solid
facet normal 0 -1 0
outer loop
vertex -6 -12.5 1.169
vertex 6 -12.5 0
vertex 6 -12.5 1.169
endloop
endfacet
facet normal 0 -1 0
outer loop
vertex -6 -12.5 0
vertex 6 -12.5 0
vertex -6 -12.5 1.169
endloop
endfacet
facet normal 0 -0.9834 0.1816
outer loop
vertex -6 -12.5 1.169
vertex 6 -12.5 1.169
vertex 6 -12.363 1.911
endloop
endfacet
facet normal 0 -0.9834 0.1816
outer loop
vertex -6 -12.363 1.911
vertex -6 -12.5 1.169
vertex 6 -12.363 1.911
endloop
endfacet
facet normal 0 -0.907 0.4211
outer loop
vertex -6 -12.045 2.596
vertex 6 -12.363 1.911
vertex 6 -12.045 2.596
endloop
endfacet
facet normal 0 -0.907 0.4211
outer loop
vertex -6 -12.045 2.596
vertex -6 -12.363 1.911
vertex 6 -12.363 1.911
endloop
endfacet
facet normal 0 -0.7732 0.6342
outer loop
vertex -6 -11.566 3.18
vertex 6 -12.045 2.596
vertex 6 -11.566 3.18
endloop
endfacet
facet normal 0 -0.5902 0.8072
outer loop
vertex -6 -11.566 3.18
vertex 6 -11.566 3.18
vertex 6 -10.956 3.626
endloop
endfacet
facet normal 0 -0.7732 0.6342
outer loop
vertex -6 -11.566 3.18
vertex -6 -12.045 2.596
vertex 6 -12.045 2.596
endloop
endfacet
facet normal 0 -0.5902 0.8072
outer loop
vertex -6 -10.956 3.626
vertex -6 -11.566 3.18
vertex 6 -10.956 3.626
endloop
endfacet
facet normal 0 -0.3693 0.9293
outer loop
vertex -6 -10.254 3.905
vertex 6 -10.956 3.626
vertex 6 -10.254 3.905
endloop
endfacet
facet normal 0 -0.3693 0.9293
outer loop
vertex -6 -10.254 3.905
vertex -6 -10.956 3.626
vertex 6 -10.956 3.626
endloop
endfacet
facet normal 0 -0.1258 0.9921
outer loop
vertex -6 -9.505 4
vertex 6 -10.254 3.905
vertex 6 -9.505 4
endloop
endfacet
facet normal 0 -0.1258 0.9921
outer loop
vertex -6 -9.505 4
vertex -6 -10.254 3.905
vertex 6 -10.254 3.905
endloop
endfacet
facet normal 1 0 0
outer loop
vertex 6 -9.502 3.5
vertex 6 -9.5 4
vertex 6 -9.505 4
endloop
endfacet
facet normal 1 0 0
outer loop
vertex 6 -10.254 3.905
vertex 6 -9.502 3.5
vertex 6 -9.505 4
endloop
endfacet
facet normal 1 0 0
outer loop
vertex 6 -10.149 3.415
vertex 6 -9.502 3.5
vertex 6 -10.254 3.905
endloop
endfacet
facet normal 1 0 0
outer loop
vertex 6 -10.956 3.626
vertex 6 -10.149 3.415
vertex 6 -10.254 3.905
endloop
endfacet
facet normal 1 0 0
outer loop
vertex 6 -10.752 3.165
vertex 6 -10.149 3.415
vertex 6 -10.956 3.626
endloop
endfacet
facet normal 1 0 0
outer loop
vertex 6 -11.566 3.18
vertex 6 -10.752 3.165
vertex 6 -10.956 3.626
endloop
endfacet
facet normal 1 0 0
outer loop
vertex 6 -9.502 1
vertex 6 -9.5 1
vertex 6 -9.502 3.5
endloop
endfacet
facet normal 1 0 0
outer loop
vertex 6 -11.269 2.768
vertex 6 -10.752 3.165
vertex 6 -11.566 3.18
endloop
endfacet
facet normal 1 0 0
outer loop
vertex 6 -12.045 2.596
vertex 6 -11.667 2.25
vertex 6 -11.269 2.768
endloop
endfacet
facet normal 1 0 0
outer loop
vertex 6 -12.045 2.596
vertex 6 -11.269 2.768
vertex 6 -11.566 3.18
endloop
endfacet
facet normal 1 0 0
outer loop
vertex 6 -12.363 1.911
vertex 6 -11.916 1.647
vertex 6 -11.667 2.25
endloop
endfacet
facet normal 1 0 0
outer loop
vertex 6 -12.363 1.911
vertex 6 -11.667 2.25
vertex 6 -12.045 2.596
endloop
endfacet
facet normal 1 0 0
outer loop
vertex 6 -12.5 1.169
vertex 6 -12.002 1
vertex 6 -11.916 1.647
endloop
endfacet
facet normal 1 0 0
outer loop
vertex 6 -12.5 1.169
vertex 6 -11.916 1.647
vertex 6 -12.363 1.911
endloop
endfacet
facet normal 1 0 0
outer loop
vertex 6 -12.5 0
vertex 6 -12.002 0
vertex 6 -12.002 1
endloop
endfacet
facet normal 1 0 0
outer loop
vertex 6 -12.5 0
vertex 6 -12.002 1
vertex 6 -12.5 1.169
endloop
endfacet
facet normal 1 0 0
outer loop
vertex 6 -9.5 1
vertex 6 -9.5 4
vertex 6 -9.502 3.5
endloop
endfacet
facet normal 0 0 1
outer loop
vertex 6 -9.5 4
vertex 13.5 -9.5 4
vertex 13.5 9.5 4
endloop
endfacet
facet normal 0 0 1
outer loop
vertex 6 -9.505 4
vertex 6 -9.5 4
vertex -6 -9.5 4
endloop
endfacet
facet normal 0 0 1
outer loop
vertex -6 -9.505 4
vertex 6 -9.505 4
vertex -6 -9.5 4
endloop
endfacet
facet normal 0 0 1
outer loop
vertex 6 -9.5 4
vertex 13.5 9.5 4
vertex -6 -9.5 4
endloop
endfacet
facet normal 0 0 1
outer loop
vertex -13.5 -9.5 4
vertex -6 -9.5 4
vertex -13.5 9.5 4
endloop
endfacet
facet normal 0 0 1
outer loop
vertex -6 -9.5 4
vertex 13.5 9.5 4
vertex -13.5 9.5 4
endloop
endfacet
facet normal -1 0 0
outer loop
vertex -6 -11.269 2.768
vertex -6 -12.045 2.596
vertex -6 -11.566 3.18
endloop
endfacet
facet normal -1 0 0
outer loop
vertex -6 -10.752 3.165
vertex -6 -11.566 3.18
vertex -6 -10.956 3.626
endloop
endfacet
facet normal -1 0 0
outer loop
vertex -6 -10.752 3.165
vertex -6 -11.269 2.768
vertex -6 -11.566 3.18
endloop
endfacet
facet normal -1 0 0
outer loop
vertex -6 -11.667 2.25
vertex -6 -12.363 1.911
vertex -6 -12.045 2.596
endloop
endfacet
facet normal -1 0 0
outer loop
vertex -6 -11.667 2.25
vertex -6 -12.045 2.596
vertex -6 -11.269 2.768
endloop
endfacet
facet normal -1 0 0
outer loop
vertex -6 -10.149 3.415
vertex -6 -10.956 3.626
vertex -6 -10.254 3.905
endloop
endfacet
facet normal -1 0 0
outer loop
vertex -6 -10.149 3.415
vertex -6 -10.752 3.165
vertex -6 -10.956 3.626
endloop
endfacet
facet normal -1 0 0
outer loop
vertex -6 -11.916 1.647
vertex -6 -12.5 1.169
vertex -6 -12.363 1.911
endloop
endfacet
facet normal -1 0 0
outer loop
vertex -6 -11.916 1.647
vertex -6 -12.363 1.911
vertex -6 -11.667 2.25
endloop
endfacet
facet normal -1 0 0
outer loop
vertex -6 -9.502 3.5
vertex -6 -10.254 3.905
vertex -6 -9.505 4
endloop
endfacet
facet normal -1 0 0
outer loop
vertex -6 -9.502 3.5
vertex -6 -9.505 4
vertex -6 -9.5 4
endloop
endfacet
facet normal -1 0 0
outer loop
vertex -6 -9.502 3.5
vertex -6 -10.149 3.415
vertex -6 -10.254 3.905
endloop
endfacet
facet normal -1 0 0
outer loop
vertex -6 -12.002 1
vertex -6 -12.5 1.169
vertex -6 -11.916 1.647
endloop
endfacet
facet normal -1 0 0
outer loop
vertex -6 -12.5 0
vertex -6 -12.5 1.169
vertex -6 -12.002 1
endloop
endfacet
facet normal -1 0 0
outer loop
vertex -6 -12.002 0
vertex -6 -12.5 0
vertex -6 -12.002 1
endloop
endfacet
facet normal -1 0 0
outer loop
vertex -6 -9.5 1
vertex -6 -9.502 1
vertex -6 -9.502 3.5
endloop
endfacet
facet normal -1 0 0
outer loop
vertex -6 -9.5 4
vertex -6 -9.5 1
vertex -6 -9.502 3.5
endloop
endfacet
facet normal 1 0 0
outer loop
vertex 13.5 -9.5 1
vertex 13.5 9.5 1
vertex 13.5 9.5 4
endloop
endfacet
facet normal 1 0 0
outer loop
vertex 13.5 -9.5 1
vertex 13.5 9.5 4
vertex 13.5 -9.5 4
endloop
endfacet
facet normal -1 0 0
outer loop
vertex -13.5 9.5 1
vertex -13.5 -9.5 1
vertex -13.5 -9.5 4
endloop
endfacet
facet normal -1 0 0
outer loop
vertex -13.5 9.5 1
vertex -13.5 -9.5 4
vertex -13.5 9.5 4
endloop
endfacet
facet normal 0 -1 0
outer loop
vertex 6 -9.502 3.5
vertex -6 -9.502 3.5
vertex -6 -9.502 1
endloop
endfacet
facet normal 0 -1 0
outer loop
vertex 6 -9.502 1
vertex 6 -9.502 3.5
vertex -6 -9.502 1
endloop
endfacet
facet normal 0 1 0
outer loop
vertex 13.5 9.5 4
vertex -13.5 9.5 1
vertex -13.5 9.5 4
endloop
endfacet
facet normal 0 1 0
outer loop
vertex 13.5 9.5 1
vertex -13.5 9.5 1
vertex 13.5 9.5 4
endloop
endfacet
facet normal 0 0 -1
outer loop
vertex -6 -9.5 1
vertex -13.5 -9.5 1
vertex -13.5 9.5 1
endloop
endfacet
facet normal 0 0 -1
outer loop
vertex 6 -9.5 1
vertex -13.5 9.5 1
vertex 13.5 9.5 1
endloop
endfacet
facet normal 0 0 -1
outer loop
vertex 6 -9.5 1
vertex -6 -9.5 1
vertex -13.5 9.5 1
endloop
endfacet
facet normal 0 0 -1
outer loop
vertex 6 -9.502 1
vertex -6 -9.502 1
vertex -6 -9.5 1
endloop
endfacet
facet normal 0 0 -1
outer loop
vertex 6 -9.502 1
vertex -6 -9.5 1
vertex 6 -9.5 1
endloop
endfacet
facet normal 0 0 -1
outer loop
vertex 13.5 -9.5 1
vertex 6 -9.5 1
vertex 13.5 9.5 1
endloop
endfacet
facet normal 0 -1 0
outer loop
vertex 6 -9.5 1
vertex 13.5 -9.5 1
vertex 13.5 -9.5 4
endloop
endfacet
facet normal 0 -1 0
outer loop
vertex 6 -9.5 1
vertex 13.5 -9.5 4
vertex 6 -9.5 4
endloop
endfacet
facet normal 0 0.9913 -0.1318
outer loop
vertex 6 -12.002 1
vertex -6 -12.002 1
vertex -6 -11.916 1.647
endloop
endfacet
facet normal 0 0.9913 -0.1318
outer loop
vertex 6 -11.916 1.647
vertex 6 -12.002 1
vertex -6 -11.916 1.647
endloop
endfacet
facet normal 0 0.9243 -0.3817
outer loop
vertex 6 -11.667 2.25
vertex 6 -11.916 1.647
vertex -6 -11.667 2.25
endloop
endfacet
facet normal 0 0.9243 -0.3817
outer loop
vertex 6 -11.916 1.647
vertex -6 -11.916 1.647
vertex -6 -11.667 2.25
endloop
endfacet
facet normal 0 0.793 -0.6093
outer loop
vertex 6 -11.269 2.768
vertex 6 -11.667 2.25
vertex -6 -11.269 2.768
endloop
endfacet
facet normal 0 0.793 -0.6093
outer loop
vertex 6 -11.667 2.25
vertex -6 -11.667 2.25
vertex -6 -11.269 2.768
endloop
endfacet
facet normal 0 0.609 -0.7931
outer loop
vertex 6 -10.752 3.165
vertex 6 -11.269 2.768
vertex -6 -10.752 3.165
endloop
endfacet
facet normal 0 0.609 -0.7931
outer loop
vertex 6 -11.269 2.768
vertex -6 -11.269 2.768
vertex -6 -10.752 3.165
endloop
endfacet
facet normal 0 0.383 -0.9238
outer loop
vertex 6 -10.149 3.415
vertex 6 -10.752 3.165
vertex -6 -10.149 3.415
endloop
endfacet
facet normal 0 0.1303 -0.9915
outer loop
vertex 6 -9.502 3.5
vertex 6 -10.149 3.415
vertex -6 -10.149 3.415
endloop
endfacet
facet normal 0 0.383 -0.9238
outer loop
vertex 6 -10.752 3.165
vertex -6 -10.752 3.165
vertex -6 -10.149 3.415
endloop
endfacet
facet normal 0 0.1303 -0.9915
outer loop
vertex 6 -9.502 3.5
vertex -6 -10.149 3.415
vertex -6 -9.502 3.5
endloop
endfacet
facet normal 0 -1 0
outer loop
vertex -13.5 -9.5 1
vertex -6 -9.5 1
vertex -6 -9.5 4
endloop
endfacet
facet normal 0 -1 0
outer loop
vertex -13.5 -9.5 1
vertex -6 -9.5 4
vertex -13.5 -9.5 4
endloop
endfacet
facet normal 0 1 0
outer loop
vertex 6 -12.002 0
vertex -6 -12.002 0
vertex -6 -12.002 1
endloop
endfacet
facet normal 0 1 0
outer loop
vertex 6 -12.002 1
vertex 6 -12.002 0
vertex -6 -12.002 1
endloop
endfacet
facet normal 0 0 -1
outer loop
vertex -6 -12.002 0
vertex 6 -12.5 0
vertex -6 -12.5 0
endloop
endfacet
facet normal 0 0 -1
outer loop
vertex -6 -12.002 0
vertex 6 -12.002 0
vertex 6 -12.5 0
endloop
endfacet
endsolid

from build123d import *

# Parameters (mm, degrees)
PAD_DEPTH       = 4
SKETCH001_W     = 27
SKETCH001_H     = 19
POCKET_DEPTH    = 1
POCKET001_DEPTH = 27
POCKET002_DEPTH = 27


with BuildPart() as part:
    # Sketch → Pad (new body)
    with BuildSketch(Plane.XY):
        Polygon((-13.5, 9.5), (13.5, 9.5), (13.5, -9.5), (6, -9.5), (6, -12.5), (-6, -12.5), (-6, -9.5), (-13.5, -9.5), align=None)
    extrude(amount=PAD_DEPTH)

    # Sketch001 (on Face9 of Pad) → Pocket (cut)
    with BuildSketch(Plane(origin=(0, 0, 0), x_dir=(1, 0, 0), z_dir=(0, 0, -1))):
        Rectangle(SKETCH001_W, SKETCH001_H)
    extrude(amount=-POCKET_DEPTH, mode=Mode.SUBTRACT)

    # Sketch002 (on Face11 of Pocket) → Pocket001 (cut)
    with BuildSketch(Plane(origin=(-13.5, 0, 0), x_dir=(0, -1, 0), z_dir=(-1, 0, 0))):
        with BuildLine():
            ThreePointArc((12.504744, 1), (11.626065, 3.12132), (9.504744, 4))
            Line((9.504744, 4), (9.504744, 5.572417))
            Line((9.504744, 5.572417), (13.03316, 5.572417))
            Line((13.03316, 5.572417), (13.03316, 1))
            Line((13.03316, 1), (12.504744, 1))
        make_face()
    extrude(amount=-POCKET001_DEPTH, mode=Mode.SUBTRACT)

    # Sketch003 (on Face11 of Pocket001) → Pocket002 (cut)
    with BuildSketch(Plane(origin=(-13.5, 0, 0), x_dir=(0, -1, 0), z_dir=(-1, 0, 0))):
        with BuildLine():
            ThreePointArc((12.001523, 1), (11.26929, 2.767767), (9.501523, 3.5))
            Line((9.501523, 3.5), (9.501523, 1))
            Line((9.501523, 1), (9.324189, 1))
            Line((9.324189, 1), (9.324189, -0.269266))
            Line((9.324189, -0.269266), (10.161053, -0.269266))
            Line((10.161053, -0.269266), (12.001523, -0.269266))
            Line((12.001523, -0.269266), (12.001523, 1))
        make_face()
    extrude(amount=-POCKET002_DEPTH, mode=Mode.SUBTRACT)


solid = part.part
